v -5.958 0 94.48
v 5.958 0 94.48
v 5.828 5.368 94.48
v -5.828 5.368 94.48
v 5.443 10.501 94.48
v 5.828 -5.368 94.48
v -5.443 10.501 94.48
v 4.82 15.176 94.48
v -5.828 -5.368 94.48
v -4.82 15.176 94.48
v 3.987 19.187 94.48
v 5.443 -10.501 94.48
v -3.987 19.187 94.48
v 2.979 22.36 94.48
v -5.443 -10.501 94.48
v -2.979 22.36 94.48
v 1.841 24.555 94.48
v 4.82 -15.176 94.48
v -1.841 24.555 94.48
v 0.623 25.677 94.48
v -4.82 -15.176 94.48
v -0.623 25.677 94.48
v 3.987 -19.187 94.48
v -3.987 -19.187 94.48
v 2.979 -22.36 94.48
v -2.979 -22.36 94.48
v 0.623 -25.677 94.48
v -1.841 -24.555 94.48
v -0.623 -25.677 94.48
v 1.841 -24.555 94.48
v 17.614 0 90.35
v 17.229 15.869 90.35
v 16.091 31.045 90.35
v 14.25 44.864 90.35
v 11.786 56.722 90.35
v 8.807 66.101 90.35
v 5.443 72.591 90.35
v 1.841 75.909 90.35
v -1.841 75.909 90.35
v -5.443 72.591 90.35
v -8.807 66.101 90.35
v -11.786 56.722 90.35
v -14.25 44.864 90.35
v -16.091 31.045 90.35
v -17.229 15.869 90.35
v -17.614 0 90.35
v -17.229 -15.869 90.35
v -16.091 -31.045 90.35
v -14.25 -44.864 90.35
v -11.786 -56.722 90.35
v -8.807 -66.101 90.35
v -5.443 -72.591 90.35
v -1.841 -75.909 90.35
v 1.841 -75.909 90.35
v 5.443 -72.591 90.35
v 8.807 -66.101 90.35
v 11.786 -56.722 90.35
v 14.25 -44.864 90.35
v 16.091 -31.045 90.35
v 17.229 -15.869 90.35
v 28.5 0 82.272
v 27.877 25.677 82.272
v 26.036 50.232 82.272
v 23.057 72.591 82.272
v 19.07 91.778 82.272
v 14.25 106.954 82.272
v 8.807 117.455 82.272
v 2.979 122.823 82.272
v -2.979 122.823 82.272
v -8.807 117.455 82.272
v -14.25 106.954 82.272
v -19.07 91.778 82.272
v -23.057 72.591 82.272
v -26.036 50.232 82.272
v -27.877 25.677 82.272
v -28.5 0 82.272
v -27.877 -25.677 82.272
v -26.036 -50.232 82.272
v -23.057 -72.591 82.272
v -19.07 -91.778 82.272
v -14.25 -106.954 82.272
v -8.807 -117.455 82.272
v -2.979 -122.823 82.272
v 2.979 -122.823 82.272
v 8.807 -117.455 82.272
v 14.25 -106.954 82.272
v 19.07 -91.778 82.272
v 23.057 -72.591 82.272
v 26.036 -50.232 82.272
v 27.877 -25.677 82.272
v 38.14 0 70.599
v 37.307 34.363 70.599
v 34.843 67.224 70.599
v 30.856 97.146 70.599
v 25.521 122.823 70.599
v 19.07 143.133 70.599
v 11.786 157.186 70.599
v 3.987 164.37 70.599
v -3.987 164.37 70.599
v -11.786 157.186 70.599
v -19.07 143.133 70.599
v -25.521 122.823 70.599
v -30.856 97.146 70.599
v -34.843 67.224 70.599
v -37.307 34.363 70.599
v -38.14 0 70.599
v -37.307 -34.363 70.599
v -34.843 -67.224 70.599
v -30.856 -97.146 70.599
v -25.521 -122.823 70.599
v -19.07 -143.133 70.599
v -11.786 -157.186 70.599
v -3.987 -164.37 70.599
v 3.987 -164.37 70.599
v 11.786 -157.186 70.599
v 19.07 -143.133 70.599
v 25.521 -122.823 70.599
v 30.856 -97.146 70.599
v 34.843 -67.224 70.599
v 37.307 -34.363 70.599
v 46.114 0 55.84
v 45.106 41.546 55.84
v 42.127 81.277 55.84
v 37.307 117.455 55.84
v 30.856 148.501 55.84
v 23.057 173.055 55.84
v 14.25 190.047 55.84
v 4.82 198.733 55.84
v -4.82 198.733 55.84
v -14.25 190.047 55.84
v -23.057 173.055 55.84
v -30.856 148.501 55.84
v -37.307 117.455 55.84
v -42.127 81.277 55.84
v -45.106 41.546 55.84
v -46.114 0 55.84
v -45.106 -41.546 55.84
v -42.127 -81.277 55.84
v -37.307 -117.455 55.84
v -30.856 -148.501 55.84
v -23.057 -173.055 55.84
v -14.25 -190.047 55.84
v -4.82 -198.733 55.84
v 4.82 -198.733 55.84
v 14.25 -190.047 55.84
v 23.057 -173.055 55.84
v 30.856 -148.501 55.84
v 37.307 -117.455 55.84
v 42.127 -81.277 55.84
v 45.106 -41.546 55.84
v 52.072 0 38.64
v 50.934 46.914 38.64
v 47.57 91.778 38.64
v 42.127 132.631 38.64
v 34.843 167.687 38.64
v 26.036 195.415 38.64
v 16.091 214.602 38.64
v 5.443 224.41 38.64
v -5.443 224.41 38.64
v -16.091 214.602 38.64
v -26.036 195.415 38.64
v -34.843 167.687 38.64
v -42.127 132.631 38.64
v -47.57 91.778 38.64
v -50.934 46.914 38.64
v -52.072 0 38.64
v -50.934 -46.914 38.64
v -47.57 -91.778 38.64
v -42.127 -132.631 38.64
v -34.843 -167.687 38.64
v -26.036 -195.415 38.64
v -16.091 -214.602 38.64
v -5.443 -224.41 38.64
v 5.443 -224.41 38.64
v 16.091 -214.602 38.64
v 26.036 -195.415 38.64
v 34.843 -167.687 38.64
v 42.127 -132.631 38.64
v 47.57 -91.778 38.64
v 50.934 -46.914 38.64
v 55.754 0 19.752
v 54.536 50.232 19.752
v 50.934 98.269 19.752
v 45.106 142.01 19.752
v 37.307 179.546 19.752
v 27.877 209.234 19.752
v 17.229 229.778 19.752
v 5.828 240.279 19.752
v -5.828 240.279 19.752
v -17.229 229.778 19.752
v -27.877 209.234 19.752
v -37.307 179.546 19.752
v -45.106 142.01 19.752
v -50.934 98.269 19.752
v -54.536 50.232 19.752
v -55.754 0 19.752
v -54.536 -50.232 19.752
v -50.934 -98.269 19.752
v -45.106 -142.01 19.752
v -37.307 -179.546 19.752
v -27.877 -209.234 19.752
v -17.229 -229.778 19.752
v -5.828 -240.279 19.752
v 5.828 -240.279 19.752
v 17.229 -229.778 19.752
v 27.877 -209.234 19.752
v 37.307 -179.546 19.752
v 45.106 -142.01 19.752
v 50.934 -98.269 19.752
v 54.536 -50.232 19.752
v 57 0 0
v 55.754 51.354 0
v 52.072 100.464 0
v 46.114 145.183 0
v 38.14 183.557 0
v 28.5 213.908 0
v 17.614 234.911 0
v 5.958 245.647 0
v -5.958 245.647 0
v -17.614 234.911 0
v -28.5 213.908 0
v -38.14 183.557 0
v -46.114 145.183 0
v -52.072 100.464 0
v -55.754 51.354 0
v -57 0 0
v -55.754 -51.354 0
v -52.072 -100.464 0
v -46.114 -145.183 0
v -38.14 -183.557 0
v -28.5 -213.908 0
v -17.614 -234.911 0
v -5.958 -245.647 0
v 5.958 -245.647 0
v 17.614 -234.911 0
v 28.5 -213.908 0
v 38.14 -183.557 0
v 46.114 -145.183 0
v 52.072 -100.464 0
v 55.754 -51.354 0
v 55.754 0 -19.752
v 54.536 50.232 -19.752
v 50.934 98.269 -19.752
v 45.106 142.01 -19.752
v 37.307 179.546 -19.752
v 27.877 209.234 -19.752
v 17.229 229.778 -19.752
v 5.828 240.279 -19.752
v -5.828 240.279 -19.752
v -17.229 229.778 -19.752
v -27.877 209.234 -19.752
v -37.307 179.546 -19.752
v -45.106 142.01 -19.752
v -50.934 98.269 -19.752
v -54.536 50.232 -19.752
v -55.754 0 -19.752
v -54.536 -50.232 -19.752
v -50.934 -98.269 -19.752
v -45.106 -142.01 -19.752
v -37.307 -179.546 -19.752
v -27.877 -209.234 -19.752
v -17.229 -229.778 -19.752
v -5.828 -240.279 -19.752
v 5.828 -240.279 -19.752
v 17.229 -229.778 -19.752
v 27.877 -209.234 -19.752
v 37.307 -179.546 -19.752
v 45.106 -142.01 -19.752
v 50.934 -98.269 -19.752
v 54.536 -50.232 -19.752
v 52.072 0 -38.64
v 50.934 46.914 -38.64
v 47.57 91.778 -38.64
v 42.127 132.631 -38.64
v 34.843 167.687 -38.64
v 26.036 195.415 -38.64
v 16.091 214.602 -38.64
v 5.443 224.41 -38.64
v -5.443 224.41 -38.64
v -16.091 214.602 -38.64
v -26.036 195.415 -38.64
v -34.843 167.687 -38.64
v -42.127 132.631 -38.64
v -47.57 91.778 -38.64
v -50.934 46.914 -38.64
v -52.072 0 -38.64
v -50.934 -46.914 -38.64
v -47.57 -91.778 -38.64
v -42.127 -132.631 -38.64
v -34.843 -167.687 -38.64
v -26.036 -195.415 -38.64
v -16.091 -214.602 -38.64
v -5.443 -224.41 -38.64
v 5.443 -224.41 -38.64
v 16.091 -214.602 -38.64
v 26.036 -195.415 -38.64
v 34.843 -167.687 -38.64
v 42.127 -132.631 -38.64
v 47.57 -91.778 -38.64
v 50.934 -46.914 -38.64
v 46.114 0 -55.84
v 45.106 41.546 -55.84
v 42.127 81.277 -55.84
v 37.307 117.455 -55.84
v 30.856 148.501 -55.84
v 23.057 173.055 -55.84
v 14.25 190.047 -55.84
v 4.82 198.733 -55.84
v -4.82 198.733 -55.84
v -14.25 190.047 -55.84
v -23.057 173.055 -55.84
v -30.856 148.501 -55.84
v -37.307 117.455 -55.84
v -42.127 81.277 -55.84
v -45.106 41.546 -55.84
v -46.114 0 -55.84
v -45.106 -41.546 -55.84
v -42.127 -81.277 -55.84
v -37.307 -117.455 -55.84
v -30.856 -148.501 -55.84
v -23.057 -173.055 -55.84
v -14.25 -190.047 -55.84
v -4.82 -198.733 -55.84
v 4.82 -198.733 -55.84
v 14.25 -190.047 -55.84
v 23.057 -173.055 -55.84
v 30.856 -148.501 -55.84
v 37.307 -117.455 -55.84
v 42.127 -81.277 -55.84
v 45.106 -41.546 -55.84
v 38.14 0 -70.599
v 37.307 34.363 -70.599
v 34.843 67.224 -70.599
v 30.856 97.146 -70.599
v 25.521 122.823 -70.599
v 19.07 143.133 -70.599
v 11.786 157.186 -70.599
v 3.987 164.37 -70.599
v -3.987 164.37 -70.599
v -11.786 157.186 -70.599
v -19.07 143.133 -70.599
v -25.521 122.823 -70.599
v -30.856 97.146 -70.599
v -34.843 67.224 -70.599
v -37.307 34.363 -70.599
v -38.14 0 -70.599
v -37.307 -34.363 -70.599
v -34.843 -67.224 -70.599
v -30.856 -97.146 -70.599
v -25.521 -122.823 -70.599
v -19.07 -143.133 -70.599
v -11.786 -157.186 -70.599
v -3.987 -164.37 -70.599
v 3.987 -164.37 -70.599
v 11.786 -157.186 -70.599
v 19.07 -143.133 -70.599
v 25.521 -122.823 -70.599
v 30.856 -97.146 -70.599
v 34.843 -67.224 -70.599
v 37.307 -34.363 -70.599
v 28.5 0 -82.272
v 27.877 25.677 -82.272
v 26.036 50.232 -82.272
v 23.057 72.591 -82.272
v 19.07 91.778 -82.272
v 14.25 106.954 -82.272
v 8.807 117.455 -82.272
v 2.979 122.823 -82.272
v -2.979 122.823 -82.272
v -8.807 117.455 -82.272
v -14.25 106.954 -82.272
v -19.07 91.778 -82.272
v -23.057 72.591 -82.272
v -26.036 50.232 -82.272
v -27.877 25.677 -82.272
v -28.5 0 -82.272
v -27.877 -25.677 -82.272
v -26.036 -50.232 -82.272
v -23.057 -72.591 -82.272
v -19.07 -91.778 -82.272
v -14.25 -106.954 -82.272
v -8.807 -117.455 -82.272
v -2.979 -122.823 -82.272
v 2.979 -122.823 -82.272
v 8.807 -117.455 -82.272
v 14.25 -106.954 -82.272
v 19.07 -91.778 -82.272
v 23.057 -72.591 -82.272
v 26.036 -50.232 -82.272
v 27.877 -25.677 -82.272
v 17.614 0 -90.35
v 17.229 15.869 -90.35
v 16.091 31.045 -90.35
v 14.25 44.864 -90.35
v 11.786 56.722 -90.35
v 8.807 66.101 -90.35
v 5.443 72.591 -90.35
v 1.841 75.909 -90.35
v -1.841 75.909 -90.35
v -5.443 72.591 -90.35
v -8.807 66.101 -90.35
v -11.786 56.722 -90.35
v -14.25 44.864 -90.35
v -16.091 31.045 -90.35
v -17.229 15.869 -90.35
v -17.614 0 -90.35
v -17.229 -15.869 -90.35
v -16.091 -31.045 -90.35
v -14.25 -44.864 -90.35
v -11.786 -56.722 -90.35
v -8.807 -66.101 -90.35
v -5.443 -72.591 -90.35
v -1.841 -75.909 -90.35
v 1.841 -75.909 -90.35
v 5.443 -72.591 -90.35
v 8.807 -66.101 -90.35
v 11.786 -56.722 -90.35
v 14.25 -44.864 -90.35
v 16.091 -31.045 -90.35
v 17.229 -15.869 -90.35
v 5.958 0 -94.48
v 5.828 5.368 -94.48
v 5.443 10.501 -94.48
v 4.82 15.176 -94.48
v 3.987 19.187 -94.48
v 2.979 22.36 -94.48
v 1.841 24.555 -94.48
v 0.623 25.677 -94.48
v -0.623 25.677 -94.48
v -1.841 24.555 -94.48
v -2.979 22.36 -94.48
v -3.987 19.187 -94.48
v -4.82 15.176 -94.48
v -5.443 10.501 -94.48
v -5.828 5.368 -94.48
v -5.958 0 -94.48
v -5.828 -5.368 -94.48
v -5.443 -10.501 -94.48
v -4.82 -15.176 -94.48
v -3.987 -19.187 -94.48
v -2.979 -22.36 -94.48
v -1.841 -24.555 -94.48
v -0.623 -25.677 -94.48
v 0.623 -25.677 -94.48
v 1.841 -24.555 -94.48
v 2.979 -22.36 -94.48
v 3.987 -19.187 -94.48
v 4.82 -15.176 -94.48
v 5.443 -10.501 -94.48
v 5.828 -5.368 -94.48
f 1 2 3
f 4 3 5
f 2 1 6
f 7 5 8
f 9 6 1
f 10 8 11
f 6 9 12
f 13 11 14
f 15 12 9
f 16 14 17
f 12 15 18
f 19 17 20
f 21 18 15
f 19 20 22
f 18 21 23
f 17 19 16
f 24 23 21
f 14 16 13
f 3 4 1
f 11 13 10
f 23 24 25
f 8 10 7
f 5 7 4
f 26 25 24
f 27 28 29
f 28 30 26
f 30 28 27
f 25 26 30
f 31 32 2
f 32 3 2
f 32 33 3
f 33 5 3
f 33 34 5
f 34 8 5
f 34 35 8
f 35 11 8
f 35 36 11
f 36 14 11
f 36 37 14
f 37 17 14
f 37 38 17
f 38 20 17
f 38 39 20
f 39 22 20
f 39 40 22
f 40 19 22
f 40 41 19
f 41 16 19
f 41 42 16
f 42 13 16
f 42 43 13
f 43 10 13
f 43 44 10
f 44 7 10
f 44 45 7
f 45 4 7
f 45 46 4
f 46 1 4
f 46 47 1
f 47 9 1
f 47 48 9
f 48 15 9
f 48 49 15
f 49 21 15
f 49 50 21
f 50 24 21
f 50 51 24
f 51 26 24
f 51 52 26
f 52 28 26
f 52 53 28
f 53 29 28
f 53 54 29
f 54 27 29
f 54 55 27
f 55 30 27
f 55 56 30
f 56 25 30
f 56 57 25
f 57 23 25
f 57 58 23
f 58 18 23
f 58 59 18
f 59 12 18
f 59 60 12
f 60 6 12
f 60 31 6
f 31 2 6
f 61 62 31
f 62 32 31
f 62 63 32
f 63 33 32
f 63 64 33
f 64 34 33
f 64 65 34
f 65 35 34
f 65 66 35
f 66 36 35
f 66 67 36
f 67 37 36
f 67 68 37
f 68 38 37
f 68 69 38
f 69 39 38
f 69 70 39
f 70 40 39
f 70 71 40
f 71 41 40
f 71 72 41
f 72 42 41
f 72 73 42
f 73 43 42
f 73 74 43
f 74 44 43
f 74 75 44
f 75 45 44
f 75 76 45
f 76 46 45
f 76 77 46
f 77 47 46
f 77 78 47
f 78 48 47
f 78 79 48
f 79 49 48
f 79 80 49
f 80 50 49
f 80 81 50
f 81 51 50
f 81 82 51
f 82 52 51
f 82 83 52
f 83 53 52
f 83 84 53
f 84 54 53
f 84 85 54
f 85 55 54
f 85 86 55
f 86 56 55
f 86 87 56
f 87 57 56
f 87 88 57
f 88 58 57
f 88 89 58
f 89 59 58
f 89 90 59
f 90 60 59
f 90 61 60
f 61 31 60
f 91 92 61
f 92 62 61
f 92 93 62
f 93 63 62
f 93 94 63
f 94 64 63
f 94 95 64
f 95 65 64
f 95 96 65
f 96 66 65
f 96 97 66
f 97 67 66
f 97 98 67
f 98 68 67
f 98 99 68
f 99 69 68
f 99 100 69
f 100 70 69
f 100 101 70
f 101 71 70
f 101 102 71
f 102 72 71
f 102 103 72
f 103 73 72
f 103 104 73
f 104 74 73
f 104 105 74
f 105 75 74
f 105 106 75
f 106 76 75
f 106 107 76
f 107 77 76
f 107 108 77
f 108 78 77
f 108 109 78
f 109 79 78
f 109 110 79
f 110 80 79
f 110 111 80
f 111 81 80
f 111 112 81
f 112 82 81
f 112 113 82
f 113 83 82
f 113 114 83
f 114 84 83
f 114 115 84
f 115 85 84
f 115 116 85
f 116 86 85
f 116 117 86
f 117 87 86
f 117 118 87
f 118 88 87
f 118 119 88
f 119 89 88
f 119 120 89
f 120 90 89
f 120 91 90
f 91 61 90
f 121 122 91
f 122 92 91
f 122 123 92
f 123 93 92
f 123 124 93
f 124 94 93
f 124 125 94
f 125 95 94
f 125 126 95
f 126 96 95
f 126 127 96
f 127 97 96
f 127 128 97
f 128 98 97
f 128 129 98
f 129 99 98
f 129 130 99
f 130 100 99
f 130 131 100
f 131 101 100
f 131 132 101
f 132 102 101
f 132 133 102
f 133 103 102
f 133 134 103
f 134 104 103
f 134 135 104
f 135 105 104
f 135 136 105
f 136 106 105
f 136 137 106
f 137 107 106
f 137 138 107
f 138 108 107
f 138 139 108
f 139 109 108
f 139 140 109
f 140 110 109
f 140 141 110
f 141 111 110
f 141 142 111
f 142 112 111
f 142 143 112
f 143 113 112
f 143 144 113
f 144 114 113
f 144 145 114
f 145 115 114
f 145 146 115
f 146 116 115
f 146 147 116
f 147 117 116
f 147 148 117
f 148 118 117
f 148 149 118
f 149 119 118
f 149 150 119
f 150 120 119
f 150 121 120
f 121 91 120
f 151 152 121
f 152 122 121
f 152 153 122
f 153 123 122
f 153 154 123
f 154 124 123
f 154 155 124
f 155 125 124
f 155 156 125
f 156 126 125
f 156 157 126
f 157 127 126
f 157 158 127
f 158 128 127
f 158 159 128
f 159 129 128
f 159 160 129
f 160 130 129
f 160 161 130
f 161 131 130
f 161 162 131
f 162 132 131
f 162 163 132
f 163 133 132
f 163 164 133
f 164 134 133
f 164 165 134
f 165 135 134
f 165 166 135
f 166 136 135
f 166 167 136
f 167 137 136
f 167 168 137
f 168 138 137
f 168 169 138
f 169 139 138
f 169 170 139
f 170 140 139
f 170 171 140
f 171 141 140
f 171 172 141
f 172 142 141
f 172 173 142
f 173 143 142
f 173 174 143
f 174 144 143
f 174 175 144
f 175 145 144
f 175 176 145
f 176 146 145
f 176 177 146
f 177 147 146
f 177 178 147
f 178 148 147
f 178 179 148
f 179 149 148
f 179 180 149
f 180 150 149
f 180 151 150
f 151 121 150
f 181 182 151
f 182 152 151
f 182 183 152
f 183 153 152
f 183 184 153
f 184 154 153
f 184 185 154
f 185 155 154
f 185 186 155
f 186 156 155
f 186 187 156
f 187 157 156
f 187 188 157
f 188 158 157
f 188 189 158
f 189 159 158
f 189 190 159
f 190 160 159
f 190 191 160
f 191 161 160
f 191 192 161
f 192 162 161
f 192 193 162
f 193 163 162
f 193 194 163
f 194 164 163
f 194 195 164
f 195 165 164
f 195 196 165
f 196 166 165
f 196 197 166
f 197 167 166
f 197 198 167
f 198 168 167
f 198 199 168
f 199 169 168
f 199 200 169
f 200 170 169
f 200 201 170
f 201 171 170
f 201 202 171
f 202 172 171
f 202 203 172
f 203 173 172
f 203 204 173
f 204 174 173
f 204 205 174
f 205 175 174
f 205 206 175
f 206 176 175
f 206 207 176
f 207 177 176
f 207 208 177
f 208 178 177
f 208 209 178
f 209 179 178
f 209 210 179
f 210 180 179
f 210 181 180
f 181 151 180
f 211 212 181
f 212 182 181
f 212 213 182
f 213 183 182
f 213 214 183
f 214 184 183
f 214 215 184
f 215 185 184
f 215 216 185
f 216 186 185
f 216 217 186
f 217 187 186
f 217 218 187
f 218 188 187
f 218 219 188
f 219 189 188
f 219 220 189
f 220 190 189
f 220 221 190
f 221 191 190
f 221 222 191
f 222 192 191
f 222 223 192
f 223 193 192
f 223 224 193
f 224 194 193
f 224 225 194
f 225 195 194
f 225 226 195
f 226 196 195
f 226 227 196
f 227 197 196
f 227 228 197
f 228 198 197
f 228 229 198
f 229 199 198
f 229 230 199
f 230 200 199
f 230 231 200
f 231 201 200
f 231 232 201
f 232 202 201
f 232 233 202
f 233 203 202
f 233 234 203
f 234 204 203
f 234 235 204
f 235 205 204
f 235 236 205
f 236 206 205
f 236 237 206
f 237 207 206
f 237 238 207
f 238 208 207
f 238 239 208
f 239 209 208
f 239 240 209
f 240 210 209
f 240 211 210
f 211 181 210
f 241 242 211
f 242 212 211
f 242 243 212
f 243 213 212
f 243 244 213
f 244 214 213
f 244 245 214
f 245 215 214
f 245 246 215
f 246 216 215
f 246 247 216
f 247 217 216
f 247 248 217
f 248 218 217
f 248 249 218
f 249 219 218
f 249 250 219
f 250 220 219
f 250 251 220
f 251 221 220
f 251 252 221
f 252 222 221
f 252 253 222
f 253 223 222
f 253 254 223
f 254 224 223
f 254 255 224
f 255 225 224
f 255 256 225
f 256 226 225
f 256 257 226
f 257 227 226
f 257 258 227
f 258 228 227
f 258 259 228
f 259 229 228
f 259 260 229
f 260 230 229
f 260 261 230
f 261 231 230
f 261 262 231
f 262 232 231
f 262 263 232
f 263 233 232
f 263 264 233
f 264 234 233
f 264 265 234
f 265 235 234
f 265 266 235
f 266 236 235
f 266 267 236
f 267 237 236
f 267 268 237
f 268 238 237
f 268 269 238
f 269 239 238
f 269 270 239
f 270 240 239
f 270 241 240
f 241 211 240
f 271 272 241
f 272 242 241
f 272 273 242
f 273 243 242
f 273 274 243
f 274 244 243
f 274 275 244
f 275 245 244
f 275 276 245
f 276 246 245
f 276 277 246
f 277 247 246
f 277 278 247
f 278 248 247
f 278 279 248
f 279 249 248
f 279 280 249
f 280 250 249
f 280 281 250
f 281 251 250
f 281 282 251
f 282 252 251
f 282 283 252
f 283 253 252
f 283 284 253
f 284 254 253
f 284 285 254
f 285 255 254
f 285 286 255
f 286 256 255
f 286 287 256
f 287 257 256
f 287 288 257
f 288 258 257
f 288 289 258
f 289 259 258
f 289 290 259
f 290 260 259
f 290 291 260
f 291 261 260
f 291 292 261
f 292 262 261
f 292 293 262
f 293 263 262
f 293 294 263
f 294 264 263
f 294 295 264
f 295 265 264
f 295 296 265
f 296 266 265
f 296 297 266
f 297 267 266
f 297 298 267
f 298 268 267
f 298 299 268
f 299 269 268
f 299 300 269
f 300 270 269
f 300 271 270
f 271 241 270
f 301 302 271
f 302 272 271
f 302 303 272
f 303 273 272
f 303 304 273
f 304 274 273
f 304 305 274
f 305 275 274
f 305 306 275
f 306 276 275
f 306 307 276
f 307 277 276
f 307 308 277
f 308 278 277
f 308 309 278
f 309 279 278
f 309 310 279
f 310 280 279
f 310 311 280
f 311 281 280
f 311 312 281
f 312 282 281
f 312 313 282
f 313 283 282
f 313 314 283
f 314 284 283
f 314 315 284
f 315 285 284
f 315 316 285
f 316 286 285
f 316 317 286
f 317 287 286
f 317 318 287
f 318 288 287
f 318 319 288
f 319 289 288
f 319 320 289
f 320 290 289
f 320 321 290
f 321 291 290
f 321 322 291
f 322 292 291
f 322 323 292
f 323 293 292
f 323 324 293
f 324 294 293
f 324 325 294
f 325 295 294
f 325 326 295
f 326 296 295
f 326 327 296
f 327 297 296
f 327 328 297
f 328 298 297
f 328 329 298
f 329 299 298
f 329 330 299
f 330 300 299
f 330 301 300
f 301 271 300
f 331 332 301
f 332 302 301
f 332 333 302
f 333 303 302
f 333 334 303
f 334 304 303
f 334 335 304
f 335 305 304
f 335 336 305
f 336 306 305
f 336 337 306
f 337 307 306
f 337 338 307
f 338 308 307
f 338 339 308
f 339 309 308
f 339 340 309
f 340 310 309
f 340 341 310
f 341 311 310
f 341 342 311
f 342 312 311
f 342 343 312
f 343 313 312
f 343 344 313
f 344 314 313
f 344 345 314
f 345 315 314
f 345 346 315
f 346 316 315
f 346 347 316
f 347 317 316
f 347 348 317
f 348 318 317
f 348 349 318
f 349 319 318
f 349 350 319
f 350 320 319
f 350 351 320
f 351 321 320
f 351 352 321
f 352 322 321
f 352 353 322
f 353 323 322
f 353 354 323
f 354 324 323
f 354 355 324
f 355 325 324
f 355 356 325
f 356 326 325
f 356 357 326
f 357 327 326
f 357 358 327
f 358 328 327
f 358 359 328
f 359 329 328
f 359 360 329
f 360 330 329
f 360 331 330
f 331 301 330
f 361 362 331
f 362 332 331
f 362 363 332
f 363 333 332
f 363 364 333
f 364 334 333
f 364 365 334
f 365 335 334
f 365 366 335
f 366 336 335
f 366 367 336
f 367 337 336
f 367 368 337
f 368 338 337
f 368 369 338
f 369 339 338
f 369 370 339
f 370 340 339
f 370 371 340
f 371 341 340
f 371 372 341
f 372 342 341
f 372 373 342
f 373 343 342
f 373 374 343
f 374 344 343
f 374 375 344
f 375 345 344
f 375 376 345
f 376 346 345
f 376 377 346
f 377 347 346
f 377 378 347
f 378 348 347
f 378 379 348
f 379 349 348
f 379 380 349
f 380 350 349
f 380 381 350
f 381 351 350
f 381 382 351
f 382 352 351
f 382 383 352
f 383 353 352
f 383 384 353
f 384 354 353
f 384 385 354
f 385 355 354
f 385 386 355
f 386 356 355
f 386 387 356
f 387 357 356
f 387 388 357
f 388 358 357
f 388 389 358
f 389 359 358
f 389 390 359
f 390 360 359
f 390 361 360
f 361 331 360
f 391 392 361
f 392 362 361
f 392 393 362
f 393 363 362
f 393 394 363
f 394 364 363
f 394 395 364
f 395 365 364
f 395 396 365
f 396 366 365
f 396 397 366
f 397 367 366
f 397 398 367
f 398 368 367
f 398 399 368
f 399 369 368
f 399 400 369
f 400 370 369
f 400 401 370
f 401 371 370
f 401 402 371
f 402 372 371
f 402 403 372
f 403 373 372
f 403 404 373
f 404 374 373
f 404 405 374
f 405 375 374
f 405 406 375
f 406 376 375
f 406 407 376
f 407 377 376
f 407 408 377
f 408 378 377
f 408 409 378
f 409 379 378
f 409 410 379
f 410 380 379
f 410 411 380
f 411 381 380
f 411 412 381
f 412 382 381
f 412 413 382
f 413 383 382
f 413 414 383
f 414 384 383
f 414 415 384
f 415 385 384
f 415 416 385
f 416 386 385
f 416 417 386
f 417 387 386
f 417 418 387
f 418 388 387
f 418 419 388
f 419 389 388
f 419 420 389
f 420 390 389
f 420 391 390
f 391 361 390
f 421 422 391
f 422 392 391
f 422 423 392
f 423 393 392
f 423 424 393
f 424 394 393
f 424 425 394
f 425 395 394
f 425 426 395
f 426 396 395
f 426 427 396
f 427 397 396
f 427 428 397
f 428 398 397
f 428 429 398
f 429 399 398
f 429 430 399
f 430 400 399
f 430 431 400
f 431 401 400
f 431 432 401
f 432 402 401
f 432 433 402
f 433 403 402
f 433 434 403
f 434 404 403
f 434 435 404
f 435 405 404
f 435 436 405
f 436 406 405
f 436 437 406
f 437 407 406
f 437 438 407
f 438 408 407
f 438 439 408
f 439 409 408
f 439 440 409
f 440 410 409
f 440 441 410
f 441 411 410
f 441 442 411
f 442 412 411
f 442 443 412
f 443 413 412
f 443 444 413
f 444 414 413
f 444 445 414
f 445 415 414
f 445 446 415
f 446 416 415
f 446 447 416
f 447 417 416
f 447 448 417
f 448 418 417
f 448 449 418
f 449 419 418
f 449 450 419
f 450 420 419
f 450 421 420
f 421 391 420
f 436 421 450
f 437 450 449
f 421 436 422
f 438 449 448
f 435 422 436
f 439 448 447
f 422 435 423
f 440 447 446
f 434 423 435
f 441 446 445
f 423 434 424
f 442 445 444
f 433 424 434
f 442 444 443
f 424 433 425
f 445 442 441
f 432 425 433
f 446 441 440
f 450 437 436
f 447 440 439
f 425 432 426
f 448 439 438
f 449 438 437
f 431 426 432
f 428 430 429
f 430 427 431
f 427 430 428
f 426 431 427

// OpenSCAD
// Generated by SolidPython 1.0.1 on 2020-07-29 00:46:45


scale(v = [3, 13, 5]) {
	sphere(r = 19);
}
/***********************************************
*********      SolidPython code:      **********
************************************************
 
# import packages: SolidPython
from solid import *
from solid.utils import *
from itertools import chain, combinations, permutations


class Resize:

    def __init__(self, scad_file):
        self.scad_file = scad_file
        #self.scad_file = import_scad(scad_file)
        # cone/cylinder param:
        self.r1 = 0
        self.r2 = 0
        self.h = 0
        # rectangular prism param:
        self.w = 0
        self.l = 0
        # ellipse param:
        self.r = 0

    # import OpenScad code (file name corresponds to shape)


    # classify shape + parameters
    def assign(self, param1, param2, param3):
        if self.scad_file == 'cone.scad':
            self.r1 = param1
            self.r2 = param2
            self.h = param3
        elif self.scad_file == 'cylinder.scad':
            self.r1 = param1
            self.r2 = param2
            self.h = param3
        elif self.scad_file == 'rectangularPrism.scad':
            self.h = param1
            self.l = param2
            self.w = param3
        else:
            self.r = param1
            self.h = param2

    # resize parameters
    def iterate(self):
        x = range(3, 20, 2)
        i = 1
        if self.scad_file == 'cone.scad':
            tempList = list(permutations(x, 2))
            for temp in tempList:
                param1 = temp[0]
                param2 = temp[1]
                filepath = 'produced_scad_files/' + 'cone' + str(param1) + '_' + str(param2) + '_' + '.scad'
                scad_render_to_file(cylinder(h=param1, r1=param2, r2=0), filepath)

        elif self.scad_file == 'cylinder.scad':
            tempList = list(permutations(x, 3))
            for temp in tempList:
                param1 = temp[0]
                param2 = temp[1]
                filepath = 'produced_scad_files/' + 'cylinder' + str(param1) + '_' + str(param2) + '_' + '.scad'
                scad_render_to_file(cylinder(h=param1, r1=param2, r2=param2), filepath)

        elif self.scad_file == 'rectangularPrism.scad':
            tempList = list(permutations(x, 3))
            for temp in tempList:
                param1 = temp[0]
                param2 = temp[1]
                param3 = temp[2]
                filepath = 'produced_scad_files/' + 'rectangularPrism' + str(param1) + '_' + str(param2) + '_' + str(
                    param3) + '.scad'
                scad_render_to_file(cube(size=(param1, param2, param3)), filepath)

        elif self.scad_file == 'ellipse.scad':
            tempList = list(permutations(x, 4))
            for temp in tempList:
                param1 = temp[0]
                param2 = temp[1]
                param3 = temp[2]
                param4 = temp[3]
                filepath = 'produced_scad_files/' + 'ellipse' + str(param1) + '_' + str(param2) + '_' + str(param3) + '_' + str(param4) + '.scad'
                scad_render_to_file(scale([param1, param2, param3])(sphere(r=param4)), filepath)

    def render_to_scadfile(self):
        scad_render_to_file(scad, 'example.scad') 
 
************************************************/
